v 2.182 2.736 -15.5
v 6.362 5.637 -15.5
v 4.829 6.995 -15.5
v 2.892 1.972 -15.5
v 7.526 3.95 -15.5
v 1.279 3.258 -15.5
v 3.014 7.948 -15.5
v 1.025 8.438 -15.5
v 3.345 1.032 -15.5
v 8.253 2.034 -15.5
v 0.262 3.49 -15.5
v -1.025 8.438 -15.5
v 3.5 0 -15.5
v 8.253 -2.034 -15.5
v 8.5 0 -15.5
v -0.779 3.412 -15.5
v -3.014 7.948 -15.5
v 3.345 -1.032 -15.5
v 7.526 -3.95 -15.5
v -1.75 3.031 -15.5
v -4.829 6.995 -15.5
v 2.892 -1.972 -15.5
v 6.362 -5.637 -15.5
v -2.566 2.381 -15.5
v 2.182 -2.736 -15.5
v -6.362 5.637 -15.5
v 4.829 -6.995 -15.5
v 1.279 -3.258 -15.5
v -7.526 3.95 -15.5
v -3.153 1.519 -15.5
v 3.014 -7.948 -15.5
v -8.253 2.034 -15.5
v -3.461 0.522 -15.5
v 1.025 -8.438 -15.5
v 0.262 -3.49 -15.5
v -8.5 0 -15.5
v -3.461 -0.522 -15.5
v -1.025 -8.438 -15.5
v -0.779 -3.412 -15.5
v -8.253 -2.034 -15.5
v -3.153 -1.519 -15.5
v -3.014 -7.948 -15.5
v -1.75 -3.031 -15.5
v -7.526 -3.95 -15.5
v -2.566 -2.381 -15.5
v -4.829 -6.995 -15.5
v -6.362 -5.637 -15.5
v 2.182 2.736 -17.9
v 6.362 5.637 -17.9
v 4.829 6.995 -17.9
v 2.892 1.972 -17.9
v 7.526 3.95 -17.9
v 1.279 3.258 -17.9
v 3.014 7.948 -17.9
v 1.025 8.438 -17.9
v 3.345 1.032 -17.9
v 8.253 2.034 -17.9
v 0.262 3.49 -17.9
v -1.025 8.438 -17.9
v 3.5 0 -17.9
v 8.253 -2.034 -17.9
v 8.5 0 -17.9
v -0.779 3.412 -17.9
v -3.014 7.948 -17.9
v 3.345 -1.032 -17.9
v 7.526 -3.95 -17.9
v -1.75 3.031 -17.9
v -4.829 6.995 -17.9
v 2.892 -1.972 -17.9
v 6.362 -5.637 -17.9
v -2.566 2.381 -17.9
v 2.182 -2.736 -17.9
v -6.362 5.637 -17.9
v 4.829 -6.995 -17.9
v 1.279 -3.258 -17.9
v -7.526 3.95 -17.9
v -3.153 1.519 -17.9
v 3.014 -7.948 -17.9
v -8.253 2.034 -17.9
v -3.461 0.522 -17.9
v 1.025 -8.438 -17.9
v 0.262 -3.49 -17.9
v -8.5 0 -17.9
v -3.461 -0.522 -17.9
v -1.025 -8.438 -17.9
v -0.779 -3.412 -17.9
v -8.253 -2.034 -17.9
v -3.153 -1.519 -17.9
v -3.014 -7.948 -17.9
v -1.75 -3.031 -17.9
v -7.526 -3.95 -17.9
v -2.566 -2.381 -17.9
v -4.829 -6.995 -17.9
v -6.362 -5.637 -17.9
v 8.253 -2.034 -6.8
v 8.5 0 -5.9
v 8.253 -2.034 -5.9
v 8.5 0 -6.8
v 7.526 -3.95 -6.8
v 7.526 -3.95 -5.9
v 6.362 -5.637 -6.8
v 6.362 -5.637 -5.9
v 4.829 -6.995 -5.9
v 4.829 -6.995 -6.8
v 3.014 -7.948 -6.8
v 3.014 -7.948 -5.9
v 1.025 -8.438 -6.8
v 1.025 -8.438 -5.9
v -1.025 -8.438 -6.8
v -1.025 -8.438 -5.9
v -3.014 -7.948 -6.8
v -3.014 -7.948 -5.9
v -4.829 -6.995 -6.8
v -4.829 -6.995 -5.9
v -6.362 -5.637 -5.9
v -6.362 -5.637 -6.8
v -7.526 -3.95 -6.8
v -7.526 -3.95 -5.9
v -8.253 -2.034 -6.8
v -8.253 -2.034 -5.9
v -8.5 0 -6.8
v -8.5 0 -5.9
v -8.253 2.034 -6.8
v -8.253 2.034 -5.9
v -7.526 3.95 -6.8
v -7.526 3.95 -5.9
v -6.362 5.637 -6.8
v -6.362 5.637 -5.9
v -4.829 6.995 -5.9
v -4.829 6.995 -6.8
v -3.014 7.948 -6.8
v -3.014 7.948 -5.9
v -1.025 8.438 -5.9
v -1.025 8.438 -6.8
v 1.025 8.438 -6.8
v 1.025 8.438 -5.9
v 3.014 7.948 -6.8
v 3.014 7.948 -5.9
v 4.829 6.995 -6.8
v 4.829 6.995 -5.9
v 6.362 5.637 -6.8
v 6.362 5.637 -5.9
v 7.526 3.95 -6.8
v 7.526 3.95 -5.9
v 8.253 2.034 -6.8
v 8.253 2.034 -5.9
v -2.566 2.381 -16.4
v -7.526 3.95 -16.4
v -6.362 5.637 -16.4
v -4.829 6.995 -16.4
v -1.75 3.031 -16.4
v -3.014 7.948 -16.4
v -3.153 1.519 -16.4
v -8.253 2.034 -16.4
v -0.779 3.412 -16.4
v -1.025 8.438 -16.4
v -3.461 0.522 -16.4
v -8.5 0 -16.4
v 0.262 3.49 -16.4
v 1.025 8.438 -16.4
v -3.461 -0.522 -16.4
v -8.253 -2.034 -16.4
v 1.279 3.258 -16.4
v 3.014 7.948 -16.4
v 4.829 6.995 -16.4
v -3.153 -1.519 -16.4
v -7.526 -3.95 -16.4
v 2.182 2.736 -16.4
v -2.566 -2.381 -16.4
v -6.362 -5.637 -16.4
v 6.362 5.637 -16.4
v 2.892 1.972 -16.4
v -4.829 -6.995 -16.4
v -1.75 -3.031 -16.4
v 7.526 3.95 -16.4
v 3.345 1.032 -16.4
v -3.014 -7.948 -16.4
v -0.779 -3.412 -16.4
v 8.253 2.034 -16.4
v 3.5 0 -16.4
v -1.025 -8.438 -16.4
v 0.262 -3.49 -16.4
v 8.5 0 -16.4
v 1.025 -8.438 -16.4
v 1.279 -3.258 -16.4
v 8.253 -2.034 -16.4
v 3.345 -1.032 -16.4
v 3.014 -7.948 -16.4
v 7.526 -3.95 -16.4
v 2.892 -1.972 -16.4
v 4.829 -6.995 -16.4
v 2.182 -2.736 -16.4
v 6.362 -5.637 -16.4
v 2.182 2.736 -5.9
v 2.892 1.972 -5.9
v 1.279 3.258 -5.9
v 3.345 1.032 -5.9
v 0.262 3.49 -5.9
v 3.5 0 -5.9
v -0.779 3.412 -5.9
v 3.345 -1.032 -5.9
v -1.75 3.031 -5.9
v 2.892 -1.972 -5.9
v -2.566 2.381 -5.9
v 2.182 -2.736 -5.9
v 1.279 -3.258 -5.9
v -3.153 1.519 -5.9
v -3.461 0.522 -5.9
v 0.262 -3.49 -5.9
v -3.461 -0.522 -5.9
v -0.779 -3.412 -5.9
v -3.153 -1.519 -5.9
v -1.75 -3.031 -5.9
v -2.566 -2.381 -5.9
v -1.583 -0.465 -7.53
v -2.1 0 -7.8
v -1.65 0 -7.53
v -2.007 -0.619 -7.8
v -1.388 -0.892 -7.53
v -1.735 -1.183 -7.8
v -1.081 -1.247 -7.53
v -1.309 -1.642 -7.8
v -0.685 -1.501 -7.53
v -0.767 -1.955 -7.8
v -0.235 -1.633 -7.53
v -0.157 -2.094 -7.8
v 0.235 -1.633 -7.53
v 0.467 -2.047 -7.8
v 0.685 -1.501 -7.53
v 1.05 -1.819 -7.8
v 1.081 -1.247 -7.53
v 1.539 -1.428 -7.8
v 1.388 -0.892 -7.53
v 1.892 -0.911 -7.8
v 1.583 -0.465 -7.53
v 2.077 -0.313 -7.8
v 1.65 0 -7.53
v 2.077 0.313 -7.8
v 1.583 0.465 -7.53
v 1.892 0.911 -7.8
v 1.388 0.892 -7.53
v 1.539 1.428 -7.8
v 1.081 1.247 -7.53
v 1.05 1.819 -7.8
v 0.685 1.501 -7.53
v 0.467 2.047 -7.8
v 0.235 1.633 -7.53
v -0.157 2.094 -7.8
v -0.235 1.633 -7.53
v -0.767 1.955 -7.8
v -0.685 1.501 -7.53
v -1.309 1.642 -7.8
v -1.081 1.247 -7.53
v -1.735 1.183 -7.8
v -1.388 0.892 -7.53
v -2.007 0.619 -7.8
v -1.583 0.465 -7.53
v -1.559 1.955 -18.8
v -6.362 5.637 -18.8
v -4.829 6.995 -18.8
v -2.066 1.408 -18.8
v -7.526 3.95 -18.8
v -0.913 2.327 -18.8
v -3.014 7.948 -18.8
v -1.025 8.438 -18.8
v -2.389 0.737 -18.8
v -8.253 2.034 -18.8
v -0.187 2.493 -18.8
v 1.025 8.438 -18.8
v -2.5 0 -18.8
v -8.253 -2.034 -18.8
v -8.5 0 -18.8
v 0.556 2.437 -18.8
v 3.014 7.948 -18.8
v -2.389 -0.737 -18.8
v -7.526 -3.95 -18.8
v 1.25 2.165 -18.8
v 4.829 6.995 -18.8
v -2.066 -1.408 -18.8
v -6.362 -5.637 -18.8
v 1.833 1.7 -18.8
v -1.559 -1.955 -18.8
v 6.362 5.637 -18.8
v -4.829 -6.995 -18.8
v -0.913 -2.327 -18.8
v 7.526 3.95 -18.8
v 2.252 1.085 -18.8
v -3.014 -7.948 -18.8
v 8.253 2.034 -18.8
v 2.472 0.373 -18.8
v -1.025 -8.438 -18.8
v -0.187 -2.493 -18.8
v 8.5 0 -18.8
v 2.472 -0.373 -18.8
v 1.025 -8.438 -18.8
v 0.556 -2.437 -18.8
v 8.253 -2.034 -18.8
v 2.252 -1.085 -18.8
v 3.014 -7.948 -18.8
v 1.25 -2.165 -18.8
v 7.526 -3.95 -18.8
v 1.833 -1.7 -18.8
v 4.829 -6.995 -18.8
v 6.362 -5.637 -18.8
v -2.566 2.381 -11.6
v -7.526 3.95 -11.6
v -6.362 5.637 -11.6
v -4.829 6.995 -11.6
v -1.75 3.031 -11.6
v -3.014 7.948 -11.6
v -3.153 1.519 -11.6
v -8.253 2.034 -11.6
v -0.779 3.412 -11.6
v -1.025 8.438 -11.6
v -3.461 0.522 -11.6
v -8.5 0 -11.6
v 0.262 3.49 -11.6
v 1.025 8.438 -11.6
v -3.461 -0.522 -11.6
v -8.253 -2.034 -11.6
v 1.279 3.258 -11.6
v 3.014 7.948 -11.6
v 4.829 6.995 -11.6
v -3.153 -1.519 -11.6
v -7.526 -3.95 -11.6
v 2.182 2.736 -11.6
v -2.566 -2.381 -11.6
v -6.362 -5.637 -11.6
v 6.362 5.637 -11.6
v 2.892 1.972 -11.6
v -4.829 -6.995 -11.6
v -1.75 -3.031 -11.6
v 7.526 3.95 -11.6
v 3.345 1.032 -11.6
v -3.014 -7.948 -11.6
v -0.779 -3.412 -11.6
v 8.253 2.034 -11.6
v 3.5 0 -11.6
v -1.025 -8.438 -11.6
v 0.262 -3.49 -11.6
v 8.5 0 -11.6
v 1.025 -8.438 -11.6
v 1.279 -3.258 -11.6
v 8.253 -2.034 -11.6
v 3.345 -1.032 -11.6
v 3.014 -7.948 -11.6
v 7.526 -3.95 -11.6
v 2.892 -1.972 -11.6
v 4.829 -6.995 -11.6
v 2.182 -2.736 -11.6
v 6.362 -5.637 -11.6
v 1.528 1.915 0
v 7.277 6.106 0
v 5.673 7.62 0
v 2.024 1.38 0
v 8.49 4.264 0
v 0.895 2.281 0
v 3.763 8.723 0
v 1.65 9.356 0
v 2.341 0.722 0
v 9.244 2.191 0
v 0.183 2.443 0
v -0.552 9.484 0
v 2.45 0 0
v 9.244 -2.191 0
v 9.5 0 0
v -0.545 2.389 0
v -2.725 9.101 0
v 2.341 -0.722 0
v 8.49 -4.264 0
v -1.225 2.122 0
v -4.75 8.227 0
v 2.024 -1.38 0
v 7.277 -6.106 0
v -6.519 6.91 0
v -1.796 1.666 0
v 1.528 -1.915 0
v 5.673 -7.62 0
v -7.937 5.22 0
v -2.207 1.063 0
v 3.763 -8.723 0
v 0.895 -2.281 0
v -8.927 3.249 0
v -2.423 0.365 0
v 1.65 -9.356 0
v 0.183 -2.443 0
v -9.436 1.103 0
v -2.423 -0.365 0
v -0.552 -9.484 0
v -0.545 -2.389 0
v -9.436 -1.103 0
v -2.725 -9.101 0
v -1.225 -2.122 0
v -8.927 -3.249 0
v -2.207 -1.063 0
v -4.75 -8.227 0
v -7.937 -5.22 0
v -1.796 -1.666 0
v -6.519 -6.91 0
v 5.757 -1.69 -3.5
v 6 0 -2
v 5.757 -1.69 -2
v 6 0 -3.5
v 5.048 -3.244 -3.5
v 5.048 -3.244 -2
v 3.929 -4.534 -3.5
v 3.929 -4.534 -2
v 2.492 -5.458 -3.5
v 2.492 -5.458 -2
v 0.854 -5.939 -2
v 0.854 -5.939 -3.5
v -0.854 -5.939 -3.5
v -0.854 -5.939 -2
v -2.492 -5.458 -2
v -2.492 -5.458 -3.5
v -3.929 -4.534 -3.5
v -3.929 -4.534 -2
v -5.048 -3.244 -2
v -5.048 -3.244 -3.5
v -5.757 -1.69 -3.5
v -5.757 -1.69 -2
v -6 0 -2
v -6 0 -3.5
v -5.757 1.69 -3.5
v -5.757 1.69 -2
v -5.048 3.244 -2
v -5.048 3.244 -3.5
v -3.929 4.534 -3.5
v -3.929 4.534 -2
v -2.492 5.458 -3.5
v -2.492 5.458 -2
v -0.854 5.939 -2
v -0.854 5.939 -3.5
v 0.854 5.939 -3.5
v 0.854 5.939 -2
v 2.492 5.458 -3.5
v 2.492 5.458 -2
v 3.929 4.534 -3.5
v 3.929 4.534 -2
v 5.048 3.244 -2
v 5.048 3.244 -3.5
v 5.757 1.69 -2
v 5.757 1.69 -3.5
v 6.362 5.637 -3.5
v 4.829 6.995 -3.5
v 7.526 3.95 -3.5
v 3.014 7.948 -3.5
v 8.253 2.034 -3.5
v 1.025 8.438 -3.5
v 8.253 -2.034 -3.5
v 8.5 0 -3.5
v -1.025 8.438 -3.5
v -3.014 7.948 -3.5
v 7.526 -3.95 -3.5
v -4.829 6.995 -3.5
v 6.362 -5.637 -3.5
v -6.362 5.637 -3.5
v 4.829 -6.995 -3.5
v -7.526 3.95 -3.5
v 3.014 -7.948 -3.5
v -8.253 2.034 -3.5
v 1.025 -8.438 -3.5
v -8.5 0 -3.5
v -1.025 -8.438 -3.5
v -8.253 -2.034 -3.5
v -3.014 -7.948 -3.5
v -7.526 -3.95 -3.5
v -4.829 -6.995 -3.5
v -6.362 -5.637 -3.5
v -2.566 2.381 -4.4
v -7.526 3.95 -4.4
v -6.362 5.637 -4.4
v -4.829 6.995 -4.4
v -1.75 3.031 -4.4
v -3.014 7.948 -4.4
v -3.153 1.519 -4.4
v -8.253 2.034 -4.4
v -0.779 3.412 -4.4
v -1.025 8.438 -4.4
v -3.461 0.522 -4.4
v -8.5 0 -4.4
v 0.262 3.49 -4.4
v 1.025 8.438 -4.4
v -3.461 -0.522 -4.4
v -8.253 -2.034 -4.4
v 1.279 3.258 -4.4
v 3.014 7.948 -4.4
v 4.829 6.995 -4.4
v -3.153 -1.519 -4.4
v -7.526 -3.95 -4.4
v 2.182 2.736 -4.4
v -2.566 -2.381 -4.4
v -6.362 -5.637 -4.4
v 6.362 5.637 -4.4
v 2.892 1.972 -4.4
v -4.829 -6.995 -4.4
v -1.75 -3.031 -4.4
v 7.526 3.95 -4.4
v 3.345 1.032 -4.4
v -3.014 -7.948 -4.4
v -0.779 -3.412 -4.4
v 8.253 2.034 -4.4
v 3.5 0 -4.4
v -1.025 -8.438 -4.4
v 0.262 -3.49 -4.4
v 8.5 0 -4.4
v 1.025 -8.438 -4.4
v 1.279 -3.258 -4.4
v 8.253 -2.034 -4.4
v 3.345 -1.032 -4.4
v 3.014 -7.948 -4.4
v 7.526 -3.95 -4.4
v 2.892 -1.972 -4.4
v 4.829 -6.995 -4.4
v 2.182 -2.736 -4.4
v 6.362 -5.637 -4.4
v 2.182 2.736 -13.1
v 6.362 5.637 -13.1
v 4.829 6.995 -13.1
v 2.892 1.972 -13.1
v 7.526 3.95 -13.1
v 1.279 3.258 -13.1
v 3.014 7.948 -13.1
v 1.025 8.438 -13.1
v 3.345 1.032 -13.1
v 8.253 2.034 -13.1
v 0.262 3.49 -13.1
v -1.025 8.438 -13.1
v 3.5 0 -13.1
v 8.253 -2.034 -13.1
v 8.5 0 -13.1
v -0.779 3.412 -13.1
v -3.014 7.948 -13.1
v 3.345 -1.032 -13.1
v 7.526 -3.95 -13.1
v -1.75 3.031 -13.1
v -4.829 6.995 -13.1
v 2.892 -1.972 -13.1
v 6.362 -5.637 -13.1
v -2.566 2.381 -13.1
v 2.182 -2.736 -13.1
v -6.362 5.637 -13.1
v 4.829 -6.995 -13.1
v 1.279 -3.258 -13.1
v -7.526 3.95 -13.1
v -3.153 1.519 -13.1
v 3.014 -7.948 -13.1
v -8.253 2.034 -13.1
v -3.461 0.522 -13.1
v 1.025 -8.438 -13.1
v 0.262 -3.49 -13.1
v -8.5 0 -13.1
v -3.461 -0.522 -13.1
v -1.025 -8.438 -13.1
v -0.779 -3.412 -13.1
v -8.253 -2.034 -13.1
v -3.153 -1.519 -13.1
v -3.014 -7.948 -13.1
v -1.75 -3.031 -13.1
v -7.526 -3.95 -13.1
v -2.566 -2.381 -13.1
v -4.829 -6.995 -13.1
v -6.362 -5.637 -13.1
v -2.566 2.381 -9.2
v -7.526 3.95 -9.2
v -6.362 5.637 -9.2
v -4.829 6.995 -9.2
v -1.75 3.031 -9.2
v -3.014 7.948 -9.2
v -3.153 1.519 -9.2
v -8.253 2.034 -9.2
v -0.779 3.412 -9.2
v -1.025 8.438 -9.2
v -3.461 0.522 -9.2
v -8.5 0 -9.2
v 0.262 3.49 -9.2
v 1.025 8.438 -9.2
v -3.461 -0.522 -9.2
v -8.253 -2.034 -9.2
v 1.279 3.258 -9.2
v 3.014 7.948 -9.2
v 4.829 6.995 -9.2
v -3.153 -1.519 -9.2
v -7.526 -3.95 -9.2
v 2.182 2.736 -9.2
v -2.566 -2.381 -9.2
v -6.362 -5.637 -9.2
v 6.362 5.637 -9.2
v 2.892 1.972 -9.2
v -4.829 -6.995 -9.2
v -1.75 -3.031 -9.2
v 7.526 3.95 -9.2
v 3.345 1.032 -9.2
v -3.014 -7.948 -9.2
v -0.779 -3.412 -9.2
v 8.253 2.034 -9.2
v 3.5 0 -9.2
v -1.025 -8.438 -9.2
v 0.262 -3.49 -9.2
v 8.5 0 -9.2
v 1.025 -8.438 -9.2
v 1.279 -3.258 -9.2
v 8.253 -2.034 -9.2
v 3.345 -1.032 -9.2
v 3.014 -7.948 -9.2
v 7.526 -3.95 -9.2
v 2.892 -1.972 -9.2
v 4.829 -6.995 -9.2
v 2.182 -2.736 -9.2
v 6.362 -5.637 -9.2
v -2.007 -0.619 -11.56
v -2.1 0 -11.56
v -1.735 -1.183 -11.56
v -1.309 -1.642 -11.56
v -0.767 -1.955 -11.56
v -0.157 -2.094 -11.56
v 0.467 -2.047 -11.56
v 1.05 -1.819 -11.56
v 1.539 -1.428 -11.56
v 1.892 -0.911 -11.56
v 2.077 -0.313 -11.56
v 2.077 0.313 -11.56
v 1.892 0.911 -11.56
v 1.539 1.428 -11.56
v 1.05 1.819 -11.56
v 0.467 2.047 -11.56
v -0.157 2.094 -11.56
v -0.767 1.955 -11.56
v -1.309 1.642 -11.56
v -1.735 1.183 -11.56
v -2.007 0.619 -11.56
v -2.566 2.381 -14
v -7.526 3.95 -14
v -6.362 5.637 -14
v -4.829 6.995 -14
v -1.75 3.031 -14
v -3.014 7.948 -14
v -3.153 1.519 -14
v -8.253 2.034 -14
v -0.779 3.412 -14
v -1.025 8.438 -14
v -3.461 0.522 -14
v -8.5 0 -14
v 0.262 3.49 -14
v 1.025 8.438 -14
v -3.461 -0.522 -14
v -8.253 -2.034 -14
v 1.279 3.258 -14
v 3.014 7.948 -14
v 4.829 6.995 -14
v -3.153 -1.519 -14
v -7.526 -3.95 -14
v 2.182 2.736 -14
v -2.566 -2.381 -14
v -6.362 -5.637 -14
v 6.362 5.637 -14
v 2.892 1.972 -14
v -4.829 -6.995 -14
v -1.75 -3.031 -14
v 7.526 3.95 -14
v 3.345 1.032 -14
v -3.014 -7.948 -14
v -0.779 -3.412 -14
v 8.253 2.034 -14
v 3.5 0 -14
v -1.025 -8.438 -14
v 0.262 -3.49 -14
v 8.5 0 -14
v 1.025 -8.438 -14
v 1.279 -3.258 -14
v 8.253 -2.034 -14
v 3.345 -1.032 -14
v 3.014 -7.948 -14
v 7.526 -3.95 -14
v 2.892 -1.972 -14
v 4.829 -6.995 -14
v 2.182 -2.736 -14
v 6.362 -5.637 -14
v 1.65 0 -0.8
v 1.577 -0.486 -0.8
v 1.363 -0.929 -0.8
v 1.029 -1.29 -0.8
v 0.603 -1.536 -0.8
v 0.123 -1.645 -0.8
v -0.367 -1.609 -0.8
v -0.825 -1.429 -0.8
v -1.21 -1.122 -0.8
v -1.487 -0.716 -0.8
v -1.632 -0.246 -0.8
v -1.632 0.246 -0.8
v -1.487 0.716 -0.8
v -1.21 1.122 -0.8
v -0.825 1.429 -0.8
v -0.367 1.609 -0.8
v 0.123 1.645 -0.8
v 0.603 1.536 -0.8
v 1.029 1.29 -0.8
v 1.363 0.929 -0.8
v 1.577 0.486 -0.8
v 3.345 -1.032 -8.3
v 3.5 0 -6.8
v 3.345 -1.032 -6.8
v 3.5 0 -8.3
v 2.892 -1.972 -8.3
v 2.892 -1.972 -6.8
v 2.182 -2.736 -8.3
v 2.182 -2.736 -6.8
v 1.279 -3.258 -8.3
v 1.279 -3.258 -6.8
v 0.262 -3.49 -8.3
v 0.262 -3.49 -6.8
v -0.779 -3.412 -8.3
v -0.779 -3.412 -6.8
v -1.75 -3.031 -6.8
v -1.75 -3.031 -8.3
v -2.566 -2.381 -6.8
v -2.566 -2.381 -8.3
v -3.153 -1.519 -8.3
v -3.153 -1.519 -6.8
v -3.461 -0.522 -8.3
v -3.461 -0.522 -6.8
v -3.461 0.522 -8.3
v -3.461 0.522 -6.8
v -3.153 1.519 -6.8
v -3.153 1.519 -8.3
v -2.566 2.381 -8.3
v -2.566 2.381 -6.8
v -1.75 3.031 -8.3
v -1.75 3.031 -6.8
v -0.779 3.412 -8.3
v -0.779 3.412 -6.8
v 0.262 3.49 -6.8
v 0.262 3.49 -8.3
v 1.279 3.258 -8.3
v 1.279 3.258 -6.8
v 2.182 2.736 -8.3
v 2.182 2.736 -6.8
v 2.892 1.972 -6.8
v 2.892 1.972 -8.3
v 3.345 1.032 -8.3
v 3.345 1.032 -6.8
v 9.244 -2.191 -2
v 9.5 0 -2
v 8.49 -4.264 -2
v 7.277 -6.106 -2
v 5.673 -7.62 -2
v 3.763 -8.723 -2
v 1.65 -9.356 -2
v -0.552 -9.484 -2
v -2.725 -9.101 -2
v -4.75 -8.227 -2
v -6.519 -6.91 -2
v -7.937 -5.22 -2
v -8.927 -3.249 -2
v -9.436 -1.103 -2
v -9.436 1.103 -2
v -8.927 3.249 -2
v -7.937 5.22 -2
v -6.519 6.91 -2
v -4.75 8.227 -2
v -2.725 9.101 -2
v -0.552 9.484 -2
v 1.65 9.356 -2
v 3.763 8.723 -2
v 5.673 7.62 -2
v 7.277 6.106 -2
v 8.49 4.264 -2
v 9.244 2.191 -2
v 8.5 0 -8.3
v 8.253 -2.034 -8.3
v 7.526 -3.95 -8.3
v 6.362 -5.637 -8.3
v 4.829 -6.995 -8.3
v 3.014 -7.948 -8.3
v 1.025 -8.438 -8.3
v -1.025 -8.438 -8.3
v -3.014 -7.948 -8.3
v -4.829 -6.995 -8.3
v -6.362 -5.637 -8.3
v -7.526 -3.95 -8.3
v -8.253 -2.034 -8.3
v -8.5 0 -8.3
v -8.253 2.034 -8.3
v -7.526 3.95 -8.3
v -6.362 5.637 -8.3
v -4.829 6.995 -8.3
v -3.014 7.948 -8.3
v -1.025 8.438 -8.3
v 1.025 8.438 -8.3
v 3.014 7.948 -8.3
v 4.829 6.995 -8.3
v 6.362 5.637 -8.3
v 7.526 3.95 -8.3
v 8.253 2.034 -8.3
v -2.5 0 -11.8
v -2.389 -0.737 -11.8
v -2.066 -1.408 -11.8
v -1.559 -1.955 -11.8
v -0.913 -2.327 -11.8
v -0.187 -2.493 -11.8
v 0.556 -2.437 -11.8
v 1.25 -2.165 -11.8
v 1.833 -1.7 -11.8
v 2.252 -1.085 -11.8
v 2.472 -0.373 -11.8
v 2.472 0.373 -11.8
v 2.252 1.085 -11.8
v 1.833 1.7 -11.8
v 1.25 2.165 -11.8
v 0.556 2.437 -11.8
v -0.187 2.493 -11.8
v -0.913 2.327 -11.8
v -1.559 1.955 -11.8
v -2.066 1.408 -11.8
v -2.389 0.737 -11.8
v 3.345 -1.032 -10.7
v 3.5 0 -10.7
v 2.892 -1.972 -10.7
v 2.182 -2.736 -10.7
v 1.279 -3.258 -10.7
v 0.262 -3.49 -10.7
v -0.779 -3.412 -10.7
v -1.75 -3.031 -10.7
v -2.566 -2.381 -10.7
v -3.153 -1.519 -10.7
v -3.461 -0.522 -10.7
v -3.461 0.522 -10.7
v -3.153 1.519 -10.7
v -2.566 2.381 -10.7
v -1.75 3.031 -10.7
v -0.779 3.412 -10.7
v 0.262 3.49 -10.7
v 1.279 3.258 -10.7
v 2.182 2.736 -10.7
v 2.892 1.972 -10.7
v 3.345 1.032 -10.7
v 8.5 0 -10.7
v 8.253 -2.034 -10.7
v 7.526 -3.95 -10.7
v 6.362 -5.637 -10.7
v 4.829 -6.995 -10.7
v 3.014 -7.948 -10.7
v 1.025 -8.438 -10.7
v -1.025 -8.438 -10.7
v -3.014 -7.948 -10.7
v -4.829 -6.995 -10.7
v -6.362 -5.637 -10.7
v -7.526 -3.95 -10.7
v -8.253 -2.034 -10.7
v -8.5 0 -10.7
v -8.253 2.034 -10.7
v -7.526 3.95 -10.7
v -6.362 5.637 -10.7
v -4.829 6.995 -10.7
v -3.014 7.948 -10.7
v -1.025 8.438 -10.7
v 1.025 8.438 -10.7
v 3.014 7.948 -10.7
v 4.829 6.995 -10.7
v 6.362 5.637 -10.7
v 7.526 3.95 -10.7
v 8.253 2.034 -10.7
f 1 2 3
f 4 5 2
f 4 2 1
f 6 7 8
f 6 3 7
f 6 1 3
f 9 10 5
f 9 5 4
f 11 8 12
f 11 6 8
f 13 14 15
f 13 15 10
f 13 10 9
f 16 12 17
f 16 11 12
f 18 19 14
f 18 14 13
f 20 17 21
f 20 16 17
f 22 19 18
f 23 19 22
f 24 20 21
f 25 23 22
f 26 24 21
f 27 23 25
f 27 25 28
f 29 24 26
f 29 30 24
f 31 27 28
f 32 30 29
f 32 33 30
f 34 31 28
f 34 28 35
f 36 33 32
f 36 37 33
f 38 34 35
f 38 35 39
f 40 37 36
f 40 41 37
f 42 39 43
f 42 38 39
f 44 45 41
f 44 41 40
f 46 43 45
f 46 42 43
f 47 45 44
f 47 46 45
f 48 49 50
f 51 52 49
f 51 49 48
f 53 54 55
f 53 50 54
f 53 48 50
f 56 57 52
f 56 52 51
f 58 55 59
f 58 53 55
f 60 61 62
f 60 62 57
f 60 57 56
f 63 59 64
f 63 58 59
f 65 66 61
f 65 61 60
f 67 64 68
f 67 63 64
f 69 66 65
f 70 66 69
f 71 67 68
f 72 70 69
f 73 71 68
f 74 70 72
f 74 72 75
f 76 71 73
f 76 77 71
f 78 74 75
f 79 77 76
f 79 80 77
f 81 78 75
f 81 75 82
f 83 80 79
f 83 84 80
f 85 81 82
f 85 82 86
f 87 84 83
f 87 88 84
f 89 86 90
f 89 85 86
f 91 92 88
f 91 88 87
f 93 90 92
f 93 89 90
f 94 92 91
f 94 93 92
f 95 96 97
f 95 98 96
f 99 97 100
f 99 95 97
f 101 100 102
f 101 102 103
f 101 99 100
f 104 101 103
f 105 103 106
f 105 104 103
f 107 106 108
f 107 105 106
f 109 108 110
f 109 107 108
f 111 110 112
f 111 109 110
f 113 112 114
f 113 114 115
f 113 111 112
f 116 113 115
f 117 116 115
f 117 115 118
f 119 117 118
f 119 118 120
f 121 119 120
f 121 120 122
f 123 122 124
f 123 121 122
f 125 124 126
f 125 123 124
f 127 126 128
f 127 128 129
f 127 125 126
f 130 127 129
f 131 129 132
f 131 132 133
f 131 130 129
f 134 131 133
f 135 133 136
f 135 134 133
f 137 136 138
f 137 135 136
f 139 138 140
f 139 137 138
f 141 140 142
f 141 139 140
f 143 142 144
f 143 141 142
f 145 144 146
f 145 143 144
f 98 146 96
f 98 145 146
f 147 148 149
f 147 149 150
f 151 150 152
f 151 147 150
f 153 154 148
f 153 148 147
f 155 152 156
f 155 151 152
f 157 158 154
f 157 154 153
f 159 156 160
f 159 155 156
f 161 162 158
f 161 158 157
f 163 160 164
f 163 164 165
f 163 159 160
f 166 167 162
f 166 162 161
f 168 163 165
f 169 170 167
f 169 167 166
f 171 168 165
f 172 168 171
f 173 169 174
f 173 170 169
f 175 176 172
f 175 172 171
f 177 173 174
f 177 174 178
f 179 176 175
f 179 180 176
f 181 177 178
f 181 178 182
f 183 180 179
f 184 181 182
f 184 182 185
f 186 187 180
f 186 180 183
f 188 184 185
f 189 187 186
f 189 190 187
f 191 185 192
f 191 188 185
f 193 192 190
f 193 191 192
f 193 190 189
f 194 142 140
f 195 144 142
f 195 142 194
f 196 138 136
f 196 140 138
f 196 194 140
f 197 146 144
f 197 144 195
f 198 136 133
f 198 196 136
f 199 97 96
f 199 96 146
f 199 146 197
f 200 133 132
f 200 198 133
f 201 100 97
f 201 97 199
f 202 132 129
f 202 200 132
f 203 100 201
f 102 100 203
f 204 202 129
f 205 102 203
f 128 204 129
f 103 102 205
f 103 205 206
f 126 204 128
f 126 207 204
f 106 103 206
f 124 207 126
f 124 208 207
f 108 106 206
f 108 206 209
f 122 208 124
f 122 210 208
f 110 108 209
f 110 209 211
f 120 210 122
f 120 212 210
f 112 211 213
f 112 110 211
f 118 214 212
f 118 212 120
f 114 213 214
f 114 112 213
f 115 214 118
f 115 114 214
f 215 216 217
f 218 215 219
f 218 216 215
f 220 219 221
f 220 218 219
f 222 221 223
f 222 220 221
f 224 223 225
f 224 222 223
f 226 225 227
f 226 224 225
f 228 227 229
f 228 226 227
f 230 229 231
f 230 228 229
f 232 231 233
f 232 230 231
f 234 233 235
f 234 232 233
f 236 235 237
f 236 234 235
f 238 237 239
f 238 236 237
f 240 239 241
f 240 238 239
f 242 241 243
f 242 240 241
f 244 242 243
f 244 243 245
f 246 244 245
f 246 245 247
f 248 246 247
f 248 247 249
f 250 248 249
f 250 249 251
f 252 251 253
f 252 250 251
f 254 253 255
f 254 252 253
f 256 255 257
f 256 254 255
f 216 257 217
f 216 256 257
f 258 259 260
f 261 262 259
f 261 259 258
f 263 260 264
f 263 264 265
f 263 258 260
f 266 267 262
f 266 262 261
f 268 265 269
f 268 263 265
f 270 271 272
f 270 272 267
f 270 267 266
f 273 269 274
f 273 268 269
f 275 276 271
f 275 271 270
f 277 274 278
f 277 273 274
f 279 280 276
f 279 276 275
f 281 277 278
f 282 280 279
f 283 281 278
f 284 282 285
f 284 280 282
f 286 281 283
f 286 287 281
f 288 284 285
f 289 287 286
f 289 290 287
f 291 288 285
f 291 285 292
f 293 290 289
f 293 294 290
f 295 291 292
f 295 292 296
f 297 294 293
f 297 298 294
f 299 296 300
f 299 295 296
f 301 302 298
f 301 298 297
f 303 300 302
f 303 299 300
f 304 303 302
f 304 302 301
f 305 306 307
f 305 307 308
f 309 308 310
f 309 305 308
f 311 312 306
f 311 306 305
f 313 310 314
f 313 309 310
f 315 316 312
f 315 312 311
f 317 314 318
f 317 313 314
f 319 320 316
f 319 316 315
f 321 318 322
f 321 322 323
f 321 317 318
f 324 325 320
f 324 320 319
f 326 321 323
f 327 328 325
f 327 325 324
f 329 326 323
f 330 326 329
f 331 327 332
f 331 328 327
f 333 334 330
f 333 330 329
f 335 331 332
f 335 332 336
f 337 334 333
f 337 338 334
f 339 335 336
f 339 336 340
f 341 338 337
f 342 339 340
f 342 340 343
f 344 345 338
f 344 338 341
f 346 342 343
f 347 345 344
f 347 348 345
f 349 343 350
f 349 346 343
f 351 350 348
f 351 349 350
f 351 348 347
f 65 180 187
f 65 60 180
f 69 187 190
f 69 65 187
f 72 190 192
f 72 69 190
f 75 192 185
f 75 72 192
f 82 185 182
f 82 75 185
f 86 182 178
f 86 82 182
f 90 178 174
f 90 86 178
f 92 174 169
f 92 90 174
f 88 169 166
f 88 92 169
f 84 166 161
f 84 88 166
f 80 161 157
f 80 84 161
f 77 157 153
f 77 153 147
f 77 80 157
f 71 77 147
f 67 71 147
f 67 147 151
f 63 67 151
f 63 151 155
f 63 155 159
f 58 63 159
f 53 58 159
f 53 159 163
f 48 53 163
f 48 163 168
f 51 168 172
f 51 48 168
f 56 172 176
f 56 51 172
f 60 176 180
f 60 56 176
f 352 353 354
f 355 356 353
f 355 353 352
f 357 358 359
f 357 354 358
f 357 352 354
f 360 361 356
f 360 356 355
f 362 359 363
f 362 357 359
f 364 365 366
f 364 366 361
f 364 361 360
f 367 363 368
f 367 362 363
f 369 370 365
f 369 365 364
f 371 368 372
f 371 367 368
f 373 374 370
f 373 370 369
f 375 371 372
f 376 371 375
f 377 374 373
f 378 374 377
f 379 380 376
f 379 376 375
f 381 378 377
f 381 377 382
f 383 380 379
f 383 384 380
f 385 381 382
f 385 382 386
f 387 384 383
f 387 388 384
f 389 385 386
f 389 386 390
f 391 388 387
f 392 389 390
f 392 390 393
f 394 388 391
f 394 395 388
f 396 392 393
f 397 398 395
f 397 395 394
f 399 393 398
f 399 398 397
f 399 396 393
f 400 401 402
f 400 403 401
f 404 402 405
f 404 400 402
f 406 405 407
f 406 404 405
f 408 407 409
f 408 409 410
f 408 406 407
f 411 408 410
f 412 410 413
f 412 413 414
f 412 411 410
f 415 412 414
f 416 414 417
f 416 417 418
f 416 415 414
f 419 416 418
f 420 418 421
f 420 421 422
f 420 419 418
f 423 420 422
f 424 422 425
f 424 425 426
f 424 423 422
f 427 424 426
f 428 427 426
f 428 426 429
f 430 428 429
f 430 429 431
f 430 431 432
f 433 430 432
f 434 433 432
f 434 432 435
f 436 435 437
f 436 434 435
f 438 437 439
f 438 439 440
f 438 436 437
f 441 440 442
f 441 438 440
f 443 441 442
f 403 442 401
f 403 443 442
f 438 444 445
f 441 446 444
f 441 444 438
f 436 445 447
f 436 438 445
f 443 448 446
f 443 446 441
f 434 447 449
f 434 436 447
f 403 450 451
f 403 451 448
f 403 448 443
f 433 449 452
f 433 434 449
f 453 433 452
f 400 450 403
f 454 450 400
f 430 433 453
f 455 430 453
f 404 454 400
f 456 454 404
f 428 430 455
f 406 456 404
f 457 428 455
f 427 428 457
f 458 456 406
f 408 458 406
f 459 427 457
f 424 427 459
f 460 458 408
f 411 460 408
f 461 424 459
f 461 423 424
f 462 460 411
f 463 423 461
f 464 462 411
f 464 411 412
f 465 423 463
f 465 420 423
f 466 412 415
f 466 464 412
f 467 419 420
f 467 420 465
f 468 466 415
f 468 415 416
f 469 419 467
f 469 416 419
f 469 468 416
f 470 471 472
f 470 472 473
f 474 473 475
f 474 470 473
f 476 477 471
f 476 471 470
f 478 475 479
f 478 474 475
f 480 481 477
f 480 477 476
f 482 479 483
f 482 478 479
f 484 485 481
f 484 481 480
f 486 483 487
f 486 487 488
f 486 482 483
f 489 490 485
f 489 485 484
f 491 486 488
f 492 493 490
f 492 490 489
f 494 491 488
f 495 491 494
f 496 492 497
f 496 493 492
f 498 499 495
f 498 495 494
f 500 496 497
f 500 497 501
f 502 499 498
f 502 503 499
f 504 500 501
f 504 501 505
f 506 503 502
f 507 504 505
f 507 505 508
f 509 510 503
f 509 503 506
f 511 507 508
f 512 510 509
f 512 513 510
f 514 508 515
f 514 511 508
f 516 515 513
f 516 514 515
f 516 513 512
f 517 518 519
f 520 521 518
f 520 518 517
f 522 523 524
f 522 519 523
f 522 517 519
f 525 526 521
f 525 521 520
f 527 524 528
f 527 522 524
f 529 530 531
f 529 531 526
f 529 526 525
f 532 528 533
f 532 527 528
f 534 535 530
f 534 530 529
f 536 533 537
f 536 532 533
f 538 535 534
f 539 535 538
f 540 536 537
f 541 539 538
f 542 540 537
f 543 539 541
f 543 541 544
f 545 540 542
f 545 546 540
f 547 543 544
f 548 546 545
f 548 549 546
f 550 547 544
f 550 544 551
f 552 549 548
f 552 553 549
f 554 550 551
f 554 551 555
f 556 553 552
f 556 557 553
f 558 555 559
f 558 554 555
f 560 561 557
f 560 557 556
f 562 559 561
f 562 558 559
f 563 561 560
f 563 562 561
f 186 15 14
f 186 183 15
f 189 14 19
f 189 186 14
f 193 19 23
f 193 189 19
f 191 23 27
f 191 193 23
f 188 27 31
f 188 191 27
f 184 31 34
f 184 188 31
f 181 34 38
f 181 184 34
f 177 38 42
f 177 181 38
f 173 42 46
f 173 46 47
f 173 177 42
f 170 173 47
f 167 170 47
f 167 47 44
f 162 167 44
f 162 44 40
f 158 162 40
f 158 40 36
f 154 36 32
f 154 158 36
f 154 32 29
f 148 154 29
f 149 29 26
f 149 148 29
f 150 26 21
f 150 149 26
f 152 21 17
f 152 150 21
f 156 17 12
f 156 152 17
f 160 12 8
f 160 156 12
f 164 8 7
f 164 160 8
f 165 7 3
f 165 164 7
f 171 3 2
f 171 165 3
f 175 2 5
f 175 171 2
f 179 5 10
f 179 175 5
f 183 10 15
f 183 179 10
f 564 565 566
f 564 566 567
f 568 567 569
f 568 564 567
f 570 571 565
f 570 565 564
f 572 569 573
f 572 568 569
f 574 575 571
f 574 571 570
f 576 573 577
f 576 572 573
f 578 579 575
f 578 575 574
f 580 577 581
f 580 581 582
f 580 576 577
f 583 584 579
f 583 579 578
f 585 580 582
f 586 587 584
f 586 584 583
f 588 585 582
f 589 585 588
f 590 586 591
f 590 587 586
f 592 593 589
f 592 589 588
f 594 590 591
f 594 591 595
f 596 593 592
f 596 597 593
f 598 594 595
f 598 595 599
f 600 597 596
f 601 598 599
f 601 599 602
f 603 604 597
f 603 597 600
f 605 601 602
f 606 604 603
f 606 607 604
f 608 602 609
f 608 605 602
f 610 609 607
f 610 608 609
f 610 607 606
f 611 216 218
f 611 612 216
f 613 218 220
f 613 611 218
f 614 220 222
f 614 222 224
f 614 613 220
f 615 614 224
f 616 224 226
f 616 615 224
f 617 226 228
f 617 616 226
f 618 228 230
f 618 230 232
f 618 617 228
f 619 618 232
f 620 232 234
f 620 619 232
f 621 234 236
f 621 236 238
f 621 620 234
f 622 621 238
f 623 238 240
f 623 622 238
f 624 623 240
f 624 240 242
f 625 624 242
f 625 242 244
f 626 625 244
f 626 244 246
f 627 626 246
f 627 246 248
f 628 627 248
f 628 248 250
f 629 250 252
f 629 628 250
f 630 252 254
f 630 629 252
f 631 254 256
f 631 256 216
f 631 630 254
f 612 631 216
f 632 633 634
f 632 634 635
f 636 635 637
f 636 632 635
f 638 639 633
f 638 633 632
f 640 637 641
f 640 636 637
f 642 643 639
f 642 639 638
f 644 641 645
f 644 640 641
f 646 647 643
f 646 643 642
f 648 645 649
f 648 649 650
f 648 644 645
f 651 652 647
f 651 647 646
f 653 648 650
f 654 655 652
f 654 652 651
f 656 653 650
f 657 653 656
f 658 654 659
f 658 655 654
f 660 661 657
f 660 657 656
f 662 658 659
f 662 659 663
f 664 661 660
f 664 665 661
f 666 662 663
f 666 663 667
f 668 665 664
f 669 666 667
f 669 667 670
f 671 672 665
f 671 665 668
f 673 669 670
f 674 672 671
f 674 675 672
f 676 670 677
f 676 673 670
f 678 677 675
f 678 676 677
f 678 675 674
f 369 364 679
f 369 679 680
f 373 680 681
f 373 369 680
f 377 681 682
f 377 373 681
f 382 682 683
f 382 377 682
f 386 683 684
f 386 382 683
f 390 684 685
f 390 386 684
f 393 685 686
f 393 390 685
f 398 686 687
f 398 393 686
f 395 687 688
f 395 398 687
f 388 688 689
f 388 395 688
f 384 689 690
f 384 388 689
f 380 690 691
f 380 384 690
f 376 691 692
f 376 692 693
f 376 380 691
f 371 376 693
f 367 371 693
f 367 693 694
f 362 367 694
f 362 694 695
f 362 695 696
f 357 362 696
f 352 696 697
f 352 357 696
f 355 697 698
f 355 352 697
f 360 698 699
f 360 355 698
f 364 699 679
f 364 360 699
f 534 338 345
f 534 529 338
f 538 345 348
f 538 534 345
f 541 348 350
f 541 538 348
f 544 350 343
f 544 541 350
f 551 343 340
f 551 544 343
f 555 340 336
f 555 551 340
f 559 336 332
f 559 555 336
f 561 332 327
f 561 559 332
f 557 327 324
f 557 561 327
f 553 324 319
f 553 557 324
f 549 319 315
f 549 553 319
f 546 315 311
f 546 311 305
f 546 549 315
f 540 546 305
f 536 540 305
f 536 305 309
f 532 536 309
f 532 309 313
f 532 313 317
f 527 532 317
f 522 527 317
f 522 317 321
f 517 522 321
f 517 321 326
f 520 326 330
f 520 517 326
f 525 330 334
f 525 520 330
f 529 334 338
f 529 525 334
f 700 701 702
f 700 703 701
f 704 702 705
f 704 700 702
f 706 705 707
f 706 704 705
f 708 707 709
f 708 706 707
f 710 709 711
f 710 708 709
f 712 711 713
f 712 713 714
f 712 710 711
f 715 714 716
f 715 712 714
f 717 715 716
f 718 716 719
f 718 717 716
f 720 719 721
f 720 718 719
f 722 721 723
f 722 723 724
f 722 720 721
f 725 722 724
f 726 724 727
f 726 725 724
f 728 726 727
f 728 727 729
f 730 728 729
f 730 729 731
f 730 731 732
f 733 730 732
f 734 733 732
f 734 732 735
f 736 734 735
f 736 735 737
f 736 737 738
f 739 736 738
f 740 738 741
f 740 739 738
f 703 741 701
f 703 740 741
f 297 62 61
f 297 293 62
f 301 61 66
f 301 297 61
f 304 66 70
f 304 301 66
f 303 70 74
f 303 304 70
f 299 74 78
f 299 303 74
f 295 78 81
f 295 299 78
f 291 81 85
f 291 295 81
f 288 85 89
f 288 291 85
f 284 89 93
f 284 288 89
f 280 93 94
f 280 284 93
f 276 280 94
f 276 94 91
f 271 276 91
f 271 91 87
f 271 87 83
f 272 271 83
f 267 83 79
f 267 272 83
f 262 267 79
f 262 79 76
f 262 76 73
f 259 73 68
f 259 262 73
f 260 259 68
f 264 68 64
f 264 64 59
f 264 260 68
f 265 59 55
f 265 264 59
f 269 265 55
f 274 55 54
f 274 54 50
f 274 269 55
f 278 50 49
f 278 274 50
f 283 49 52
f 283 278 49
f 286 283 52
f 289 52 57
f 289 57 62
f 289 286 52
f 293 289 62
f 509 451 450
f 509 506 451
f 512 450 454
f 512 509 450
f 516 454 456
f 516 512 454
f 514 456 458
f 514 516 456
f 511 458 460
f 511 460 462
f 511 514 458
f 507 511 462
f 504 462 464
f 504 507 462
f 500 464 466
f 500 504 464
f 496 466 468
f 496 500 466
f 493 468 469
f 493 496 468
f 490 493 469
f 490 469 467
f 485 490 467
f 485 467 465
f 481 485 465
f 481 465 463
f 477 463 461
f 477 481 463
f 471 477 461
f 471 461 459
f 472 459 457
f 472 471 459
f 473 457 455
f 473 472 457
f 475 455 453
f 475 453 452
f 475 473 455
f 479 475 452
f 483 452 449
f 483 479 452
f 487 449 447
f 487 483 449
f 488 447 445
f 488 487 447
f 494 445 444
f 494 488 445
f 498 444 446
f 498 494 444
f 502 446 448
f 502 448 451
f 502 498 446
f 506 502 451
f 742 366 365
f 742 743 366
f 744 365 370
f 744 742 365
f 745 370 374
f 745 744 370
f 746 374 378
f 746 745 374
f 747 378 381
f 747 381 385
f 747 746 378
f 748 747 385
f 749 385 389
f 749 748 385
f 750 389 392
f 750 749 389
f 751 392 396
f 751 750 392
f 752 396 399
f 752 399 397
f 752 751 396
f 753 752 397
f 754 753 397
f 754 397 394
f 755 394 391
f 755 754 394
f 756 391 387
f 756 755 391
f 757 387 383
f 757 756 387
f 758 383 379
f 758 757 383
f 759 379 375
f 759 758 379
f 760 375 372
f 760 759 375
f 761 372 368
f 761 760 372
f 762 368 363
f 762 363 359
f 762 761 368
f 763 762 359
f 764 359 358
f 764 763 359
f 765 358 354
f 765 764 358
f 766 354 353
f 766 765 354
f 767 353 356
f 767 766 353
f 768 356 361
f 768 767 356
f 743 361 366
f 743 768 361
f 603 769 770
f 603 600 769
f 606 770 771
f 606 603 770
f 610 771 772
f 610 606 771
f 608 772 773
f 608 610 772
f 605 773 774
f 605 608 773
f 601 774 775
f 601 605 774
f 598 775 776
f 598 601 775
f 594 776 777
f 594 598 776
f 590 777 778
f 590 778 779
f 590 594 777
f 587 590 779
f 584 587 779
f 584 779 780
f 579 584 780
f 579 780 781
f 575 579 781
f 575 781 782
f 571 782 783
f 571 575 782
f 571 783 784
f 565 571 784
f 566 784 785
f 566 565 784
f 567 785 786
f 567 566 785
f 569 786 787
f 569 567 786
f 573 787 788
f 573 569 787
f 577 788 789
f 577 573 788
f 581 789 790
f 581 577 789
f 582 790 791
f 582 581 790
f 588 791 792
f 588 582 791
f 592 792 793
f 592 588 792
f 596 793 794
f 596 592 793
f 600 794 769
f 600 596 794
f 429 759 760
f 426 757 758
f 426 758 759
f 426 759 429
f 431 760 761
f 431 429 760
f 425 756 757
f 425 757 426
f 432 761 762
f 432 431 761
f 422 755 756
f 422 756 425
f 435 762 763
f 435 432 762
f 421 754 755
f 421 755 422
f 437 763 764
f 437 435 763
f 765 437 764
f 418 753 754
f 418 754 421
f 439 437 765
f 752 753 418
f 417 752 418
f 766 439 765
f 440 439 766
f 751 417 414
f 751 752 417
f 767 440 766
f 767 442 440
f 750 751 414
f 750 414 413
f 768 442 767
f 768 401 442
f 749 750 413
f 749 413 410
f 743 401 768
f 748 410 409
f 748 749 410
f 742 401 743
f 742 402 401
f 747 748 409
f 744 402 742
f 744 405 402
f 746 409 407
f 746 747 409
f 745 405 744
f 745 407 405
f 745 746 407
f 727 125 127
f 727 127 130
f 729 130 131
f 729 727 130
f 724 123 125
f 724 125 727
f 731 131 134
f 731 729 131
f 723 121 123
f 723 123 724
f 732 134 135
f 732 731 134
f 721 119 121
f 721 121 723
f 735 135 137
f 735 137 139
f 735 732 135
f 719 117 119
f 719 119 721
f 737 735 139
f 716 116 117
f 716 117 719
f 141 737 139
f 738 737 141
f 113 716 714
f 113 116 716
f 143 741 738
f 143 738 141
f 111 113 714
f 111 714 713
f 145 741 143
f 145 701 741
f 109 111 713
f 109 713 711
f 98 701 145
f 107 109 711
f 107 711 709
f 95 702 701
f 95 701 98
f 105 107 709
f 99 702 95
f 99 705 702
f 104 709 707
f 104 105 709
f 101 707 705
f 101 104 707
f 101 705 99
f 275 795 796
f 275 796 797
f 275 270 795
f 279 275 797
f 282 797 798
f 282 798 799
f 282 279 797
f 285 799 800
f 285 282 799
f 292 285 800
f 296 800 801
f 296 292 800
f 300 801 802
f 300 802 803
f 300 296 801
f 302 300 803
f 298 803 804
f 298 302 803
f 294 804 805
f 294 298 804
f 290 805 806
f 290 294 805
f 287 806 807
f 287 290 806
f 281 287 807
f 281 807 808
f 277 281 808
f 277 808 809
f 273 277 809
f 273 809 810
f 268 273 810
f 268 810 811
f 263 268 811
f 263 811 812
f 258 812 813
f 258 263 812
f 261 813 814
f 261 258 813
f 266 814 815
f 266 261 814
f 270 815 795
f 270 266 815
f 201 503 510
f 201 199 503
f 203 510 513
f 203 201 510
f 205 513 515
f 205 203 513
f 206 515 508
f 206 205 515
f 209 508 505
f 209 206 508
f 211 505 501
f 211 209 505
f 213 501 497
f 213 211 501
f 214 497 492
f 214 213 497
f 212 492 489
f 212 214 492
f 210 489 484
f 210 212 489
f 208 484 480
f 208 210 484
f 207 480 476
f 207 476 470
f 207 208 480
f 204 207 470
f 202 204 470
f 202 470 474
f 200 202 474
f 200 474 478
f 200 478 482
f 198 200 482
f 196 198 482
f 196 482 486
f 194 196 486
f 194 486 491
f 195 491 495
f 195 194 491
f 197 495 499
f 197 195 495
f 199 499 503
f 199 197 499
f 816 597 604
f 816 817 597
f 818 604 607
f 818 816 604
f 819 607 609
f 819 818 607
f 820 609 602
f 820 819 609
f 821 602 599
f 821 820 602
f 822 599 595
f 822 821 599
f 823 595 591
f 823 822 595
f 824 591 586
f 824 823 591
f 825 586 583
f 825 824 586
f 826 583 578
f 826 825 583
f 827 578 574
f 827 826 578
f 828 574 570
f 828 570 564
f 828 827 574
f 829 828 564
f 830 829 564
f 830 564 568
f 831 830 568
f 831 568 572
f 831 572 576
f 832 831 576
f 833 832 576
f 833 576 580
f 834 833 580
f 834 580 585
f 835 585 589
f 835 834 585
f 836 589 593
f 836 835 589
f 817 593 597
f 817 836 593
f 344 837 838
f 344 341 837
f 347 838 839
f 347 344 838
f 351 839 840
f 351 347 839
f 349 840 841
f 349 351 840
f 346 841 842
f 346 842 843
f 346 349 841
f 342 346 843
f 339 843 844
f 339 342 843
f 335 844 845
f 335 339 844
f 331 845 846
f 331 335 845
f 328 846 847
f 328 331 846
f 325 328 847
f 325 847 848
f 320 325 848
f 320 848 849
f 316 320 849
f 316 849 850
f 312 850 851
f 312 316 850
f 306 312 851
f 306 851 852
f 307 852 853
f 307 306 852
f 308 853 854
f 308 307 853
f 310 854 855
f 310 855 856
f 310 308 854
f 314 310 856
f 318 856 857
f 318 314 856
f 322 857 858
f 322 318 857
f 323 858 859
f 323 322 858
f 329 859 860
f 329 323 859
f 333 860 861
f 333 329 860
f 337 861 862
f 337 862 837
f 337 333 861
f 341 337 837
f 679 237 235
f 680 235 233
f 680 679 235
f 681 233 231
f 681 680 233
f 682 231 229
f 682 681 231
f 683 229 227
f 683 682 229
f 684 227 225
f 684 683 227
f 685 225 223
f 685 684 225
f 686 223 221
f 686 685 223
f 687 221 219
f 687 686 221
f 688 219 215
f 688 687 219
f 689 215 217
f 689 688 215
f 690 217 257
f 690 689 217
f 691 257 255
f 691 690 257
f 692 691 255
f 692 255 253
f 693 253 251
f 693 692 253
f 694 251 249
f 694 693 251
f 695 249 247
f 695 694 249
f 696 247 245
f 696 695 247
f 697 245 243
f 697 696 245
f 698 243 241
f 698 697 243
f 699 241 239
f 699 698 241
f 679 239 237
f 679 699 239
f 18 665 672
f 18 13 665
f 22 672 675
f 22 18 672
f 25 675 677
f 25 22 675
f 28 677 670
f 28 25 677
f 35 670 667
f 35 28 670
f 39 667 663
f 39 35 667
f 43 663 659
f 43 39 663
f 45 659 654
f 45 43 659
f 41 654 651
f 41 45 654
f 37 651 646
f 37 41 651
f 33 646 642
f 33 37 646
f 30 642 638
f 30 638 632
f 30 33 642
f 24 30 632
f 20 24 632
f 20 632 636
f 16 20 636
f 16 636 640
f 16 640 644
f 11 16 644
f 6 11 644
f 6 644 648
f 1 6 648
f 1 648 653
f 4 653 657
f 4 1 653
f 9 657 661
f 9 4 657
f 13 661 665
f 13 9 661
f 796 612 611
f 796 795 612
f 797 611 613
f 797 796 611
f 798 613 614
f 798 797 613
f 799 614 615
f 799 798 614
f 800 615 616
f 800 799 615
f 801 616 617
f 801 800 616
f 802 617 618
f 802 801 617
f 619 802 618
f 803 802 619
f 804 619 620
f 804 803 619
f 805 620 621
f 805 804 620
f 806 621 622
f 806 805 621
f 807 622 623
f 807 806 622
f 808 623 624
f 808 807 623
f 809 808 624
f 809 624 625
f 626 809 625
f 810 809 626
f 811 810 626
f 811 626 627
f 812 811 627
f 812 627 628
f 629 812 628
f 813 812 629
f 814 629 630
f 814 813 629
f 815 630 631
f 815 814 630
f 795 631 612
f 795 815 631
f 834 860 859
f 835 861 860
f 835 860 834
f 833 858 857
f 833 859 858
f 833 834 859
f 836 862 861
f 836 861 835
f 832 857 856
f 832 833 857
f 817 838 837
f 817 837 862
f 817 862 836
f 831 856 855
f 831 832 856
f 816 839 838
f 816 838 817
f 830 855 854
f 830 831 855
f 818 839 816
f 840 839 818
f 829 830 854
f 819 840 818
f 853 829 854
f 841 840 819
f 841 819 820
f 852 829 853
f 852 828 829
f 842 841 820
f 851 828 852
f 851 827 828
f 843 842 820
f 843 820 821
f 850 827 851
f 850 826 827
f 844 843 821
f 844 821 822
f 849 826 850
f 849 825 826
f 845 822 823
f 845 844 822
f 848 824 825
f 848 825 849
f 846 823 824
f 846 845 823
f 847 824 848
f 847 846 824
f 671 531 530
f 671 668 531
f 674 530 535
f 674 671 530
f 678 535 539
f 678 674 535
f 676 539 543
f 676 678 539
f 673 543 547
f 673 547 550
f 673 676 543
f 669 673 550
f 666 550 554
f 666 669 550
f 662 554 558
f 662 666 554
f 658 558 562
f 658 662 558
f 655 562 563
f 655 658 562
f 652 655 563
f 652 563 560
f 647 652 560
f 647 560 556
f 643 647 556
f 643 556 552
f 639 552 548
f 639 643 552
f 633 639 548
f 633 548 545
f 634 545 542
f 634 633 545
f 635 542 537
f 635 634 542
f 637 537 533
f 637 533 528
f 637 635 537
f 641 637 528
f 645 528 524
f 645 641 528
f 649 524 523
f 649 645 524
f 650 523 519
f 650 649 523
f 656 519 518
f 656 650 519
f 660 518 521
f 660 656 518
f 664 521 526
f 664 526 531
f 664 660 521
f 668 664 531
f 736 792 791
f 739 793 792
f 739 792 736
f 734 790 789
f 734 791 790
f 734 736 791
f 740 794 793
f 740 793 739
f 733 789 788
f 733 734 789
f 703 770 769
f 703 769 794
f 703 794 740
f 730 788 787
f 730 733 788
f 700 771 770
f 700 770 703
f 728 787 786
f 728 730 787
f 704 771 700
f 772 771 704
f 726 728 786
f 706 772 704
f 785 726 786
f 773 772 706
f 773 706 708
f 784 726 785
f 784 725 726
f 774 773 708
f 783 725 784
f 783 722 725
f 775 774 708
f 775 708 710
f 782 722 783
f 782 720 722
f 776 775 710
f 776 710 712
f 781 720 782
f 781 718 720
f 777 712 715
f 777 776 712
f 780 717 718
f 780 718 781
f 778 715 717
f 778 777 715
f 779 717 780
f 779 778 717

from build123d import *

# Parameters (mm, degrees)
CHAMFER1_SIZE = 0.8


with BuildPart() as part:
    # Sketch2 → Revolve1 (revolve)
    with BuildSketch(Plane(origin=(0, 0, 0), x_dir=(1, 0, 0), z_dir=(0, 1, 0))):
        Polygon((1.65, 18.8), (1.65, 0), (9.5, 0), (9.5, 2), (6, 2), (6, 3.5), (8.5, 3.5), (8.5, 4.4), (3.5, 4.4), (3.5, 5.9), (8.5, 5.9), (8.5, 6.8), (3.5, 6.8), (3.5, 8.3), (8.5, 8.3), (8.5, 9.2), (3.5, 9.2), (3.5, 10.7), (8.5, 10.7), (8.5, 11.6), (3.5, 11.6), (3.5, 13.1), (8.5, 13.1), (8.5, 14), (3.5, 14), (3.5, 15.5), (8.5, 15.5), (8.5, 16.4), (3.5, 16.4), (3.5, 17.9), (8.5, 17.9), (8.5, 18.8), align=None)
    revolve(axis=Axis((0, 0, 0), (0, 0, -1)))

    # Chamfer1
    chamfer1_edges = [part.edges().sort_by_distance(p)[0] for p in [
        (-1.65, 0, 0),
    ]]
    chamfer(chamfer1_edges, length=CHAMFER1_SIZE)

    # Sketch4 → Cut-Revolve1 (revolve, cut)
    with BuildSketch(Plane(origin=(0, 0, 0), x_dir=(1, 0, 0), z_dir=(0, 1, 0)), mode=Mode.PRIVATE) as cut_revolve1_sk:
        Polygon((0, 7.529612721), (1.65, 7.529612721), (2.1, 7.8), (2.1, 11.559655752), (2.5, 11.8), (2.5, 18.8), (0, 18.8), align=None)
    revolve(cut_revolve1_sk.sketch.rotate(Axis((0, 0, -18.8), (0, 0, 1)), 180), axis=Axis((0, 0, -18.8), (0, 0, 1)), mode=Mode.SUBTRACT)


solid = part.part
